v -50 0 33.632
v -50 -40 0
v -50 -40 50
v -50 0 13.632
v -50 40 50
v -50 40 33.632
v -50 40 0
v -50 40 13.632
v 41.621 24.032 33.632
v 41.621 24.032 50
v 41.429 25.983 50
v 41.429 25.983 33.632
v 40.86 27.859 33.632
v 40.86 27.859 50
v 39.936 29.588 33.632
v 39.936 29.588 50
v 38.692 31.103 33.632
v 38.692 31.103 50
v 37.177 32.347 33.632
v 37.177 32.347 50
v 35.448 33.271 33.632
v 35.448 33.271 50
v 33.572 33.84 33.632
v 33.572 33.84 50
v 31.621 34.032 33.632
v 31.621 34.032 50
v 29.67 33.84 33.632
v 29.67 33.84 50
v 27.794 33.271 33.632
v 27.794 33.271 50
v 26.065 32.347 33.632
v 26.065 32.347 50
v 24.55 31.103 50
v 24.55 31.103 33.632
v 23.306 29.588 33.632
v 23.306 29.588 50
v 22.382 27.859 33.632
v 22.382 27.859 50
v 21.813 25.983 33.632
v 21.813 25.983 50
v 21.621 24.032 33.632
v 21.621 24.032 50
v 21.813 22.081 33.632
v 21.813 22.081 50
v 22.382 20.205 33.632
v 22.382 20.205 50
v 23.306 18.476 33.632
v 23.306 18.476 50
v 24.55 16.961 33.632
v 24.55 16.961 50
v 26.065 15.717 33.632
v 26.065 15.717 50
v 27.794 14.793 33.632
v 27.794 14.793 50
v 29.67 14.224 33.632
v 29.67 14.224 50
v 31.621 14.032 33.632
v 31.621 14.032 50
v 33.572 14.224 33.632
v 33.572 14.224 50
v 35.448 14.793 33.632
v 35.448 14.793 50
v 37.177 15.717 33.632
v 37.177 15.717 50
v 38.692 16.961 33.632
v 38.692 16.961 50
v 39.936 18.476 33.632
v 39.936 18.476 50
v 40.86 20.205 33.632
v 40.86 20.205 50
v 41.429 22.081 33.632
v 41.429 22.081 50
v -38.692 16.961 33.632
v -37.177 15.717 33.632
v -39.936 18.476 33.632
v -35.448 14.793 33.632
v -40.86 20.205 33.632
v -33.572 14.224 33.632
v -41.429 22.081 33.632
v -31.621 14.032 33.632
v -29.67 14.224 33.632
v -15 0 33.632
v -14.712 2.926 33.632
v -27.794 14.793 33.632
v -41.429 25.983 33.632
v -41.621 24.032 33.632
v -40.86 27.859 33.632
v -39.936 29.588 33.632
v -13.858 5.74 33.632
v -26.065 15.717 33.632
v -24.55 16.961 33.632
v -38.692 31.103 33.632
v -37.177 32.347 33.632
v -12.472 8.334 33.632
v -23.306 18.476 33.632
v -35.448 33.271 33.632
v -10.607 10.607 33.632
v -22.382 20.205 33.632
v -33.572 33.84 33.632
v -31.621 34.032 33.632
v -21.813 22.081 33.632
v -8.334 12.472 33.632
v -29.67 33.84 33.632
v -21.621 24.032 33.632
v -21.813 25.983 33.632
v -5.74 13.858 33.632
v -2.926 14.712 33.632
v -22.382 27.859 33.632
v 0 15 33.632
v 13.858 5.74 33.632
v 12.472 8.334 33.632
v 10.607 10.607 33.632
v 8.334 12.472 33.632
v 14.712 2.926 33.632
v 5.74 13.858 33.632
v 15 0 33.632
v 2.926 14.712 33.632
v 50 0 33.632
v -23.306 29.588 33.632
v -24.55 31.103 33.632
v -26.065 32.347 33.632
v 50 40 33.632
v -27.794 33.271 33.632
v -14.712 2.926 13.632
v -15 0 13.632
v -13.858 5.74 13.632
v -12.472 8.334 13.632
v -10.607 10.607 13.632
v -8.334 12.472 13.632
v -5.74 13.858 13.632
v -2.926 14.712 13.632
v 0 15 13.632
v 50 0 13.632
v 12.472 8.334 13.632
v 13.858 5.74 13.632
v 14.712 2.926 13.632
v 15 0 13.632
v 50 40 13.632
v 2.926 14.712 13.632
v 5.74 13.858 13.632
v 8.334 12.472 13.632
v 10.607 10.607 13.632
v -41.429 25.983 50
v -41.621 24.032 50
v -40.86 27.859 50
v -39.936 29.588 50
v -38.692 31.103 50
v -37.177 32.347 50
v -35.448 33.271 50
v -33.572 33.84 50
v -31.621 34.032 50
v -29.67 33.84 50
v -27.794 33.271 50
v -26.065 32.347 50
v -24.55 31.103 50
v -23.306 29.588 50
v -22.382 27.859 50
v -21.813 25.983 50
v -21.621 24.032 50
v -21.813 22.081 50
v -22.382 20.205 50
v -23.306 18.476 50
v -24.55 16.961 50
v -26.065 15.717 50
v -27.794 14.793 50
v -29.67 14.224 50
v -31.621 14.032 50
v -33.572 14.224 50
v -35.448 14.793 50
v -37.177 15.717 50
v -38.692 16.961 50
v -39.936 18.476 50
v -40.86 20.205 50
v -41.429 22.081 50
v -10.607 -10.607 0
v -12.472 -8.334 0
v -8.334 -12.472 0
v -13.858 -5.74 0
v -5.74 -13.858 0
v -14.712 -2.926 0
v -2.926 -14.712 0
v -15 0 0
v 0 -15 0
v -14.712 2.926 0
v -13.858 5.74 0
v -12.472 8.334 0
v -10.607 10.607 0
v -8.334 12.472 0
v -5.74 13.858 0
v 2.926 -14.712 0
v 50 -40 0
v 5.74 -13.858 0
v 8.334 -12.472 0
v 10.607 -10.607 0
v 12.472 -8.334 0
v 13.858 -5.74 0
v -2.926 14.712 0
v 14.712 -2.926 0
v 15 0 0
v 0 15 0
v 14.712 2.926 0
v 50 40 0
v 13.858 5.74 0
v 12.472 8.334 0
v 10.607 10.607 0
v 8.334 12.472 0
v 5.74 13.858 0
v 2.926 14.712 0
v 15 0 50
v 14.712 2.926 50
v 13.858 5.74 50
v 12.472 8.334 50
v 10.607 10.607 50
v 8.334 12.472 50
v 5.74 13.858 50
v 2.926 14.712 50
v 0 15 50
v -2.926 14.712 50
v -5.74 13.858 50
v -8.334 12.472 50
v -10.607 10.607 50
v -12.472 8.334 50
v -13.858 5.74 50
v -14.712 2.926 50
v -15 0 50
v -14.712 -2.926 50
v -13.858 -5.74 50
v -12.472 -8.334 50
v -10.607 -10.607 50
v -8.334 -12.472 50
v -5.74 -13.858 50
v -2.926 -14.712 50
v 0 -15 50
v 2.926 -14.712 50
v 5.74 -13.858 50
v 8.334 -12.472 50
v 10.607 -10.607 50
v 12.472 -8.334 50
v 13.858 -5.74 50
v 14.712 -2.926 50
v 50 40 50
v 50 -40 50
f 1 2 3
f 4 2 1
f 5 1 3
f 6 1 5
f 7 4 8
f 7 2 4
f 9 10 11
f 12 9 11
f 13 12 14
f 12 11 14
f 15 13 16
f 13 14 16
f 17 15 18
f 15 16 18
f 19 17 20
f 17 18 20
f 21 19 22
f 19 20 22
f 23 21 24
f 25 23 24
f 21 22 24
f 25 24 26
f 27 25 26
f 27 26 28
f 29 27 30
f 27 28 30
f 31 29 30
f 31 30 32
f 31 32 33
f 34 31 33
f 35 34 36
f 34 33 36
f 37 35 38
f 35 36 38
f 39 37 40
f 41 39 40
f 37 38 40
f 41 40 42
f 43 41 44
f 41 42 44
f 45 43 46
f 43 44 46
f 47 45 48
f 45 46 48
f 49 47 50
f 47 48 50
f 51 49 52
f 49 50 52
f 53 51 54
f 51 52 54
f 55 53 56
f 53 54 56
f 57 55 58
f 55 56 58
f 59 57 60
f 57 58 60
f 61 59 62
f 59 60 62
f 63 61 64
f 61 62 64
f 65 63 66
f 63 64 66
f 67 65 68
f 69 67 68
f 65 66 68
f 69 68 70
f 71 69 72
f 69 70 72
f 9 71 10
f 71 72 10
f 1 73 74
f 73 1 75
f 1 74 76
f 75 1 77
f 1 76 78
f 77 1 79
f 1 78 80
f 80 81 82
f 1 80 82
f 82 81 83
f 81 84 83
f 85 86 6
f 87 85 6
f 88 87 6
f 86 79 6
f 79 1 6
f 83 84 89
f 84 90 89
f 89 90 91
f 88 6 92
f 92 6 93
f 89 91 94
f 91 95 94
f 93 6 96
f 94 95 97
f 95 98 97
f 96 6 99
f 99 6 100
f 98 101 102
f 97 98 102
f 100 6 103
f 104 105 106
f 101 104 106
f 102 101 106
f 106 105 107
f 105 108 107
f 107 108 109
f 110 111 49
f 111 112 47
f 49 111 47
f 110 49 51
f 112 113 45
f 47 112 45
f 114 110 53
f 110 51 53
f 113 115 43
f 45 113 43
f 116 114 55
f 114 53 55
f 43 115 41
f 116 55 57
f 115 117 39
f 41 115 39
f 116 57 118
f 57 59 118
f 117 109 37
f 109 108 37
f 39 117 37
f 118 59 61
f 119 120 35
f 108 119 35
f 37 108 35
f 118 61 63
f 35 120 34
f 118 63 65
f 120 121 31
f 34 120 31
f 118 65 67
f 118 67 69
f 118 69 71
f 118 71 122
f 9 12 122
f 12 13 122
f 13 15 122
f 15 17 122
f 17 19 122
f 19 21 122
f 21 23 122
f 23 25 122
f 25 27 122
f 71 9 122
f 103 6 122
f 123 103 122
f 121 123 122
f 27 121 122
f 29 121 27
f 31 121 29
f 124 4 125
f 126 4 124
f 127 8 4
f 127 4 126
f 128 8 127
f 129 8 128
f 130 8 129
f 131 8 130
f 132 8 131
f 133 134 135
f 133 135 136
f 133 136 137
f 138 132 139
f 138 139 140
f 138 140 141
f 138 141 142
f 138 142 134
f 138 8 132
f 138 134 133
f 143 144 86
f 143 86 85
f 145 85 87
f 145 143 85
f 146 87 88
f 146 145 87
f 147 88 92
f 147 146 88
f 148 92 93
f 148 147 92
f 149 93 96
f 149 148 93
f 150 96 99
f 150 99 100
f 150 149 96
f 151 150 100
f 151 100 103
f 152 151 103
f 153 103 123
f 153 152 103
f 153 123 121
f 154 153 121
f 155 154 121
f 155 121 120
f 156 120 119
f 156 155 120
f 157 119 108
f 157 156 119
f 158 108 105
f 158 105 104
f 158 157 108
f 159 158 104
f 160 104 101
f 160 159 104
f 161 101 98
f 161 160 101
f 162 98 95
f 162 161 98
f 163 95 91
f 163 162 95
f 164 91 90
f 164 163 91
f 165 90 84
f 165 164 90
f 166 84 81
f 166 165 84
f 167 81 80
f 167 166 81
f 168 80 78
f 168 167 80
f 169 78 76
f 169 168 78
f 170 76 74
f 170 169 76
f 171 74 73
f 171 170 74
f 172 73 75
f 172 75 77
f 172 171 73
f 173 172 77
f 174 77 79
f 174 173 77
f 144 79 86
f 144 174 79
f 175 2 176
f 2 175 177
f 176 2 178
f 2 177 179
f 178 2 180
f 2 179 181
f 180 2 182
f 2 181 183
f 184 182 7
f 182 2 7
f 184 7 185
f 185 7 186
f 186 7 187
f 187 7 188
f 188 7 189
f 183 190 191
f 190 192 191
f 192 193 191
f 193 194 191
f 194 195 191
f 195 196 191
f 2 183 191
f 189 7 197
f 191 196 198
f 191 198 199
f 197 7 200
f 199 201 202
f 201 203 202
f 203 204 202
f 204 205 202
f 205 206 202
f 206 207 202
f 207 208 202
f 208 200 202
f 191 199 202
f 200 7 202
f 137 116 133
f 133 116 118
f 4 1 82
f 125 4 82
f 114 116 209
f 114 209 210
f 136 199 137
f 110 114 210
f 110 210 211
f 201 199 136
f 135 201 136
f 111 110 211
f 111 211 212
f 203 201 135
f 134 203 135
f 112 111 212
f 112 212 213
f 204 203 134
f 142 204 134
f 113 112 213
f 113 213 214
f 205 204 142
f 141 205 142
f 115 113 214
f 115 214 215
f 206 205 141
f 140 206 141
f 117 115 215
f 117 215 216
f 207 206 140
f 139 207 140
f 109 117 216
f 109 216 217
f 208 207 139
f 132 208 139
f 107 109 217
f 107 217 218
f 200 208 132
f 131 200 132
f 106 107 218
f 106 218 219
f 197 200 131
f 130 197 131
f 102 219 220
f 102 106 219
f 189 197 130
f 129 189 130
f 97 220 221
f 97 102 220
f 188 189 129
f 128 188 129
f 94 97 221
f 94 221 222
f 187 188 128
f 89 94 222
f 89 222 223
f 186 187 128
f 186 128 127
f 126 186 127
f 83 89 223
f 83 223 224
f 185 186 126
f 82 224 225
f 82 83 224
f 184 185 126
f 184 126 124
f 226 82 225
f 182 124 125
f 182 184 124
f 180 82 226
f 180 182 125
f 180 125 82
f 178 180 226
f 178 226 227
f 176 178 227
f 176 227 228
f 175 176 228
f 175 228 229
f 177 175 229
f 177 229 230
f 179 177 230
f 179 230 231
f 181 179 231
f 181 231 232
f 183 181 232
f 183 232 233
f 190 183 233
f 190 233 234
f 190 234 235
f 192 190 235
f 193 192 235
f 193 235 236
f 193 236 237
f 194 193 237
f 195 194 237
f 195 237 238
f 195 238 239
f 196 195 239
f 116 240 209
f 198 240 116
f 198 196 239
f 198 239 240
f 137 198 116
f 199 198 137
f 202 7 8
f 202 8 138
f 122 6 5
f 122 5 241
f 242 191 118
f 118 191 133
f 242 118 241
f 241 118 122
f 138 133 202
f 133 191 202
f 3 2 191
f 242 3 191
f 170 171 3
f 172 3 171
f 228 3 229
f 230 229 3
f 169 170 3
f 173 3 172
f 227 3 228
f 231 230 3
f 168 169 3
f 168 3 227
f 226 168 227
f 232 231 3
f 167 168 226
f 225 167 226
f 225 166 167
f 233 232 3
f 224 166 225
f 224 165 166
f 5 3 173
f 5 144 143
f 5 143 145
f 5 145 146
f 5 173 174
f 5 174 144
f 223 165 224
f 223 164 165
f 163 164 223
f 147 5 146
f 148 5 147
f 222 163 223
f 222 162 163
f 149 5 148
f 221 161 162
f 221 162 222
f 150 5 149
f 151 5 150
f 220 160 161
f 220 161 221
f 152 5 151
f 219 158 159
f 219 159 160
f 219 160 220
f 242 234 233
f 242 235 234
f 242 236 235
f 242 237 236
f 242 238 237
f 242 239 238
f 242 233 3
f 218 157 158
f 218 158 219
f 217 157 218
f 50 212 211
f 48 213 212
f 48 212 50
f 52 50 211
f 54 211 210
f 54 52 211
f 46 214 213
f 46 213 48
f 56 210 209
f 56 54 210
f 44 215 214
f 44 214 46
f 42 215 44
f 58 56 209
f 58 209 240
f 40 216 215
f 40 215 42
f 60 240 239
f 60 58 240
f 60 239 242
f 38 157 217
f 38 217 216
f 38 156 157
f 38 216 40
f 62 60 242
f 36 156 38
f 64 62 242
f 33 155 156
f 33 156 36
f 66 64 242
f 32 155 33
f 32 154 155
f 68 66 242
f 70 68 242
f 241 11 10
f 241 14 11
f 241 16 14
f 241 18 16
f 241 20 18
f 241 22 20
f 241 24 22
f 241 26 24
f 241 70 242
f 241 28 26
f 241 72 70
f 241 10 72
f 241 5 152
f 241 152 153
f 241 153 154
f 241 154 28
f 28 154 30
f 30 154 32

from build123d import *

# Parameters (mm, degrees)
F0_W     = 100
F0_H     = 80
F0_R     = 15
F1_DEPTH = 50
F3_W     = 122.5489005446
F3_H     = 20
F4_DEPTH = 40
F5_R     = 10
F6_DEPTH = 16.3678393885


# Not quite as in the source:
# - a pattern or mirror of a feature is missing from the dataset's text; its kind, count and spacing are read off the source's solid


with BuildPart() as f1:
    # F0 (on Top) → F1 (new body)
    with BuildSketch(Plane.XY):
        Rectangle(F0_W, F0_H)
        Circle(F0_R, mode=Mode.SUBTRACT)
    extrude(amount=F1_DEPTH)

    # F3 (on offset) → F4 (cut)
    with BuildSketch(Plane.XZ.offset(-40)):
        with Locations((0.9837634861, 23.6321606115)):
            Rectangle(F3_W, F3_H)
    extrude(amount=F4_DEPTH, mode=Mode.SUBTRACT)

    # F5 (on face) → F6 (cut, through all)
    with BuildSketch(Plane.XY.offset(50)):
        with Locations((31.620990485, 24.0319501609)):
            Circle(F5_R)
    f6 = extrude(amount=-F6_DEPTH, mode=Mode.SUBTRACT)

    # F6_copies: F6 across plane
    add(f6.mirror(Plane(origin=(0, 0, 0), x_dir=(0, 0, -1), z_dir=(-1, 0, 0))), mode=Mode.SUBTRACT)


solid = f1.part
